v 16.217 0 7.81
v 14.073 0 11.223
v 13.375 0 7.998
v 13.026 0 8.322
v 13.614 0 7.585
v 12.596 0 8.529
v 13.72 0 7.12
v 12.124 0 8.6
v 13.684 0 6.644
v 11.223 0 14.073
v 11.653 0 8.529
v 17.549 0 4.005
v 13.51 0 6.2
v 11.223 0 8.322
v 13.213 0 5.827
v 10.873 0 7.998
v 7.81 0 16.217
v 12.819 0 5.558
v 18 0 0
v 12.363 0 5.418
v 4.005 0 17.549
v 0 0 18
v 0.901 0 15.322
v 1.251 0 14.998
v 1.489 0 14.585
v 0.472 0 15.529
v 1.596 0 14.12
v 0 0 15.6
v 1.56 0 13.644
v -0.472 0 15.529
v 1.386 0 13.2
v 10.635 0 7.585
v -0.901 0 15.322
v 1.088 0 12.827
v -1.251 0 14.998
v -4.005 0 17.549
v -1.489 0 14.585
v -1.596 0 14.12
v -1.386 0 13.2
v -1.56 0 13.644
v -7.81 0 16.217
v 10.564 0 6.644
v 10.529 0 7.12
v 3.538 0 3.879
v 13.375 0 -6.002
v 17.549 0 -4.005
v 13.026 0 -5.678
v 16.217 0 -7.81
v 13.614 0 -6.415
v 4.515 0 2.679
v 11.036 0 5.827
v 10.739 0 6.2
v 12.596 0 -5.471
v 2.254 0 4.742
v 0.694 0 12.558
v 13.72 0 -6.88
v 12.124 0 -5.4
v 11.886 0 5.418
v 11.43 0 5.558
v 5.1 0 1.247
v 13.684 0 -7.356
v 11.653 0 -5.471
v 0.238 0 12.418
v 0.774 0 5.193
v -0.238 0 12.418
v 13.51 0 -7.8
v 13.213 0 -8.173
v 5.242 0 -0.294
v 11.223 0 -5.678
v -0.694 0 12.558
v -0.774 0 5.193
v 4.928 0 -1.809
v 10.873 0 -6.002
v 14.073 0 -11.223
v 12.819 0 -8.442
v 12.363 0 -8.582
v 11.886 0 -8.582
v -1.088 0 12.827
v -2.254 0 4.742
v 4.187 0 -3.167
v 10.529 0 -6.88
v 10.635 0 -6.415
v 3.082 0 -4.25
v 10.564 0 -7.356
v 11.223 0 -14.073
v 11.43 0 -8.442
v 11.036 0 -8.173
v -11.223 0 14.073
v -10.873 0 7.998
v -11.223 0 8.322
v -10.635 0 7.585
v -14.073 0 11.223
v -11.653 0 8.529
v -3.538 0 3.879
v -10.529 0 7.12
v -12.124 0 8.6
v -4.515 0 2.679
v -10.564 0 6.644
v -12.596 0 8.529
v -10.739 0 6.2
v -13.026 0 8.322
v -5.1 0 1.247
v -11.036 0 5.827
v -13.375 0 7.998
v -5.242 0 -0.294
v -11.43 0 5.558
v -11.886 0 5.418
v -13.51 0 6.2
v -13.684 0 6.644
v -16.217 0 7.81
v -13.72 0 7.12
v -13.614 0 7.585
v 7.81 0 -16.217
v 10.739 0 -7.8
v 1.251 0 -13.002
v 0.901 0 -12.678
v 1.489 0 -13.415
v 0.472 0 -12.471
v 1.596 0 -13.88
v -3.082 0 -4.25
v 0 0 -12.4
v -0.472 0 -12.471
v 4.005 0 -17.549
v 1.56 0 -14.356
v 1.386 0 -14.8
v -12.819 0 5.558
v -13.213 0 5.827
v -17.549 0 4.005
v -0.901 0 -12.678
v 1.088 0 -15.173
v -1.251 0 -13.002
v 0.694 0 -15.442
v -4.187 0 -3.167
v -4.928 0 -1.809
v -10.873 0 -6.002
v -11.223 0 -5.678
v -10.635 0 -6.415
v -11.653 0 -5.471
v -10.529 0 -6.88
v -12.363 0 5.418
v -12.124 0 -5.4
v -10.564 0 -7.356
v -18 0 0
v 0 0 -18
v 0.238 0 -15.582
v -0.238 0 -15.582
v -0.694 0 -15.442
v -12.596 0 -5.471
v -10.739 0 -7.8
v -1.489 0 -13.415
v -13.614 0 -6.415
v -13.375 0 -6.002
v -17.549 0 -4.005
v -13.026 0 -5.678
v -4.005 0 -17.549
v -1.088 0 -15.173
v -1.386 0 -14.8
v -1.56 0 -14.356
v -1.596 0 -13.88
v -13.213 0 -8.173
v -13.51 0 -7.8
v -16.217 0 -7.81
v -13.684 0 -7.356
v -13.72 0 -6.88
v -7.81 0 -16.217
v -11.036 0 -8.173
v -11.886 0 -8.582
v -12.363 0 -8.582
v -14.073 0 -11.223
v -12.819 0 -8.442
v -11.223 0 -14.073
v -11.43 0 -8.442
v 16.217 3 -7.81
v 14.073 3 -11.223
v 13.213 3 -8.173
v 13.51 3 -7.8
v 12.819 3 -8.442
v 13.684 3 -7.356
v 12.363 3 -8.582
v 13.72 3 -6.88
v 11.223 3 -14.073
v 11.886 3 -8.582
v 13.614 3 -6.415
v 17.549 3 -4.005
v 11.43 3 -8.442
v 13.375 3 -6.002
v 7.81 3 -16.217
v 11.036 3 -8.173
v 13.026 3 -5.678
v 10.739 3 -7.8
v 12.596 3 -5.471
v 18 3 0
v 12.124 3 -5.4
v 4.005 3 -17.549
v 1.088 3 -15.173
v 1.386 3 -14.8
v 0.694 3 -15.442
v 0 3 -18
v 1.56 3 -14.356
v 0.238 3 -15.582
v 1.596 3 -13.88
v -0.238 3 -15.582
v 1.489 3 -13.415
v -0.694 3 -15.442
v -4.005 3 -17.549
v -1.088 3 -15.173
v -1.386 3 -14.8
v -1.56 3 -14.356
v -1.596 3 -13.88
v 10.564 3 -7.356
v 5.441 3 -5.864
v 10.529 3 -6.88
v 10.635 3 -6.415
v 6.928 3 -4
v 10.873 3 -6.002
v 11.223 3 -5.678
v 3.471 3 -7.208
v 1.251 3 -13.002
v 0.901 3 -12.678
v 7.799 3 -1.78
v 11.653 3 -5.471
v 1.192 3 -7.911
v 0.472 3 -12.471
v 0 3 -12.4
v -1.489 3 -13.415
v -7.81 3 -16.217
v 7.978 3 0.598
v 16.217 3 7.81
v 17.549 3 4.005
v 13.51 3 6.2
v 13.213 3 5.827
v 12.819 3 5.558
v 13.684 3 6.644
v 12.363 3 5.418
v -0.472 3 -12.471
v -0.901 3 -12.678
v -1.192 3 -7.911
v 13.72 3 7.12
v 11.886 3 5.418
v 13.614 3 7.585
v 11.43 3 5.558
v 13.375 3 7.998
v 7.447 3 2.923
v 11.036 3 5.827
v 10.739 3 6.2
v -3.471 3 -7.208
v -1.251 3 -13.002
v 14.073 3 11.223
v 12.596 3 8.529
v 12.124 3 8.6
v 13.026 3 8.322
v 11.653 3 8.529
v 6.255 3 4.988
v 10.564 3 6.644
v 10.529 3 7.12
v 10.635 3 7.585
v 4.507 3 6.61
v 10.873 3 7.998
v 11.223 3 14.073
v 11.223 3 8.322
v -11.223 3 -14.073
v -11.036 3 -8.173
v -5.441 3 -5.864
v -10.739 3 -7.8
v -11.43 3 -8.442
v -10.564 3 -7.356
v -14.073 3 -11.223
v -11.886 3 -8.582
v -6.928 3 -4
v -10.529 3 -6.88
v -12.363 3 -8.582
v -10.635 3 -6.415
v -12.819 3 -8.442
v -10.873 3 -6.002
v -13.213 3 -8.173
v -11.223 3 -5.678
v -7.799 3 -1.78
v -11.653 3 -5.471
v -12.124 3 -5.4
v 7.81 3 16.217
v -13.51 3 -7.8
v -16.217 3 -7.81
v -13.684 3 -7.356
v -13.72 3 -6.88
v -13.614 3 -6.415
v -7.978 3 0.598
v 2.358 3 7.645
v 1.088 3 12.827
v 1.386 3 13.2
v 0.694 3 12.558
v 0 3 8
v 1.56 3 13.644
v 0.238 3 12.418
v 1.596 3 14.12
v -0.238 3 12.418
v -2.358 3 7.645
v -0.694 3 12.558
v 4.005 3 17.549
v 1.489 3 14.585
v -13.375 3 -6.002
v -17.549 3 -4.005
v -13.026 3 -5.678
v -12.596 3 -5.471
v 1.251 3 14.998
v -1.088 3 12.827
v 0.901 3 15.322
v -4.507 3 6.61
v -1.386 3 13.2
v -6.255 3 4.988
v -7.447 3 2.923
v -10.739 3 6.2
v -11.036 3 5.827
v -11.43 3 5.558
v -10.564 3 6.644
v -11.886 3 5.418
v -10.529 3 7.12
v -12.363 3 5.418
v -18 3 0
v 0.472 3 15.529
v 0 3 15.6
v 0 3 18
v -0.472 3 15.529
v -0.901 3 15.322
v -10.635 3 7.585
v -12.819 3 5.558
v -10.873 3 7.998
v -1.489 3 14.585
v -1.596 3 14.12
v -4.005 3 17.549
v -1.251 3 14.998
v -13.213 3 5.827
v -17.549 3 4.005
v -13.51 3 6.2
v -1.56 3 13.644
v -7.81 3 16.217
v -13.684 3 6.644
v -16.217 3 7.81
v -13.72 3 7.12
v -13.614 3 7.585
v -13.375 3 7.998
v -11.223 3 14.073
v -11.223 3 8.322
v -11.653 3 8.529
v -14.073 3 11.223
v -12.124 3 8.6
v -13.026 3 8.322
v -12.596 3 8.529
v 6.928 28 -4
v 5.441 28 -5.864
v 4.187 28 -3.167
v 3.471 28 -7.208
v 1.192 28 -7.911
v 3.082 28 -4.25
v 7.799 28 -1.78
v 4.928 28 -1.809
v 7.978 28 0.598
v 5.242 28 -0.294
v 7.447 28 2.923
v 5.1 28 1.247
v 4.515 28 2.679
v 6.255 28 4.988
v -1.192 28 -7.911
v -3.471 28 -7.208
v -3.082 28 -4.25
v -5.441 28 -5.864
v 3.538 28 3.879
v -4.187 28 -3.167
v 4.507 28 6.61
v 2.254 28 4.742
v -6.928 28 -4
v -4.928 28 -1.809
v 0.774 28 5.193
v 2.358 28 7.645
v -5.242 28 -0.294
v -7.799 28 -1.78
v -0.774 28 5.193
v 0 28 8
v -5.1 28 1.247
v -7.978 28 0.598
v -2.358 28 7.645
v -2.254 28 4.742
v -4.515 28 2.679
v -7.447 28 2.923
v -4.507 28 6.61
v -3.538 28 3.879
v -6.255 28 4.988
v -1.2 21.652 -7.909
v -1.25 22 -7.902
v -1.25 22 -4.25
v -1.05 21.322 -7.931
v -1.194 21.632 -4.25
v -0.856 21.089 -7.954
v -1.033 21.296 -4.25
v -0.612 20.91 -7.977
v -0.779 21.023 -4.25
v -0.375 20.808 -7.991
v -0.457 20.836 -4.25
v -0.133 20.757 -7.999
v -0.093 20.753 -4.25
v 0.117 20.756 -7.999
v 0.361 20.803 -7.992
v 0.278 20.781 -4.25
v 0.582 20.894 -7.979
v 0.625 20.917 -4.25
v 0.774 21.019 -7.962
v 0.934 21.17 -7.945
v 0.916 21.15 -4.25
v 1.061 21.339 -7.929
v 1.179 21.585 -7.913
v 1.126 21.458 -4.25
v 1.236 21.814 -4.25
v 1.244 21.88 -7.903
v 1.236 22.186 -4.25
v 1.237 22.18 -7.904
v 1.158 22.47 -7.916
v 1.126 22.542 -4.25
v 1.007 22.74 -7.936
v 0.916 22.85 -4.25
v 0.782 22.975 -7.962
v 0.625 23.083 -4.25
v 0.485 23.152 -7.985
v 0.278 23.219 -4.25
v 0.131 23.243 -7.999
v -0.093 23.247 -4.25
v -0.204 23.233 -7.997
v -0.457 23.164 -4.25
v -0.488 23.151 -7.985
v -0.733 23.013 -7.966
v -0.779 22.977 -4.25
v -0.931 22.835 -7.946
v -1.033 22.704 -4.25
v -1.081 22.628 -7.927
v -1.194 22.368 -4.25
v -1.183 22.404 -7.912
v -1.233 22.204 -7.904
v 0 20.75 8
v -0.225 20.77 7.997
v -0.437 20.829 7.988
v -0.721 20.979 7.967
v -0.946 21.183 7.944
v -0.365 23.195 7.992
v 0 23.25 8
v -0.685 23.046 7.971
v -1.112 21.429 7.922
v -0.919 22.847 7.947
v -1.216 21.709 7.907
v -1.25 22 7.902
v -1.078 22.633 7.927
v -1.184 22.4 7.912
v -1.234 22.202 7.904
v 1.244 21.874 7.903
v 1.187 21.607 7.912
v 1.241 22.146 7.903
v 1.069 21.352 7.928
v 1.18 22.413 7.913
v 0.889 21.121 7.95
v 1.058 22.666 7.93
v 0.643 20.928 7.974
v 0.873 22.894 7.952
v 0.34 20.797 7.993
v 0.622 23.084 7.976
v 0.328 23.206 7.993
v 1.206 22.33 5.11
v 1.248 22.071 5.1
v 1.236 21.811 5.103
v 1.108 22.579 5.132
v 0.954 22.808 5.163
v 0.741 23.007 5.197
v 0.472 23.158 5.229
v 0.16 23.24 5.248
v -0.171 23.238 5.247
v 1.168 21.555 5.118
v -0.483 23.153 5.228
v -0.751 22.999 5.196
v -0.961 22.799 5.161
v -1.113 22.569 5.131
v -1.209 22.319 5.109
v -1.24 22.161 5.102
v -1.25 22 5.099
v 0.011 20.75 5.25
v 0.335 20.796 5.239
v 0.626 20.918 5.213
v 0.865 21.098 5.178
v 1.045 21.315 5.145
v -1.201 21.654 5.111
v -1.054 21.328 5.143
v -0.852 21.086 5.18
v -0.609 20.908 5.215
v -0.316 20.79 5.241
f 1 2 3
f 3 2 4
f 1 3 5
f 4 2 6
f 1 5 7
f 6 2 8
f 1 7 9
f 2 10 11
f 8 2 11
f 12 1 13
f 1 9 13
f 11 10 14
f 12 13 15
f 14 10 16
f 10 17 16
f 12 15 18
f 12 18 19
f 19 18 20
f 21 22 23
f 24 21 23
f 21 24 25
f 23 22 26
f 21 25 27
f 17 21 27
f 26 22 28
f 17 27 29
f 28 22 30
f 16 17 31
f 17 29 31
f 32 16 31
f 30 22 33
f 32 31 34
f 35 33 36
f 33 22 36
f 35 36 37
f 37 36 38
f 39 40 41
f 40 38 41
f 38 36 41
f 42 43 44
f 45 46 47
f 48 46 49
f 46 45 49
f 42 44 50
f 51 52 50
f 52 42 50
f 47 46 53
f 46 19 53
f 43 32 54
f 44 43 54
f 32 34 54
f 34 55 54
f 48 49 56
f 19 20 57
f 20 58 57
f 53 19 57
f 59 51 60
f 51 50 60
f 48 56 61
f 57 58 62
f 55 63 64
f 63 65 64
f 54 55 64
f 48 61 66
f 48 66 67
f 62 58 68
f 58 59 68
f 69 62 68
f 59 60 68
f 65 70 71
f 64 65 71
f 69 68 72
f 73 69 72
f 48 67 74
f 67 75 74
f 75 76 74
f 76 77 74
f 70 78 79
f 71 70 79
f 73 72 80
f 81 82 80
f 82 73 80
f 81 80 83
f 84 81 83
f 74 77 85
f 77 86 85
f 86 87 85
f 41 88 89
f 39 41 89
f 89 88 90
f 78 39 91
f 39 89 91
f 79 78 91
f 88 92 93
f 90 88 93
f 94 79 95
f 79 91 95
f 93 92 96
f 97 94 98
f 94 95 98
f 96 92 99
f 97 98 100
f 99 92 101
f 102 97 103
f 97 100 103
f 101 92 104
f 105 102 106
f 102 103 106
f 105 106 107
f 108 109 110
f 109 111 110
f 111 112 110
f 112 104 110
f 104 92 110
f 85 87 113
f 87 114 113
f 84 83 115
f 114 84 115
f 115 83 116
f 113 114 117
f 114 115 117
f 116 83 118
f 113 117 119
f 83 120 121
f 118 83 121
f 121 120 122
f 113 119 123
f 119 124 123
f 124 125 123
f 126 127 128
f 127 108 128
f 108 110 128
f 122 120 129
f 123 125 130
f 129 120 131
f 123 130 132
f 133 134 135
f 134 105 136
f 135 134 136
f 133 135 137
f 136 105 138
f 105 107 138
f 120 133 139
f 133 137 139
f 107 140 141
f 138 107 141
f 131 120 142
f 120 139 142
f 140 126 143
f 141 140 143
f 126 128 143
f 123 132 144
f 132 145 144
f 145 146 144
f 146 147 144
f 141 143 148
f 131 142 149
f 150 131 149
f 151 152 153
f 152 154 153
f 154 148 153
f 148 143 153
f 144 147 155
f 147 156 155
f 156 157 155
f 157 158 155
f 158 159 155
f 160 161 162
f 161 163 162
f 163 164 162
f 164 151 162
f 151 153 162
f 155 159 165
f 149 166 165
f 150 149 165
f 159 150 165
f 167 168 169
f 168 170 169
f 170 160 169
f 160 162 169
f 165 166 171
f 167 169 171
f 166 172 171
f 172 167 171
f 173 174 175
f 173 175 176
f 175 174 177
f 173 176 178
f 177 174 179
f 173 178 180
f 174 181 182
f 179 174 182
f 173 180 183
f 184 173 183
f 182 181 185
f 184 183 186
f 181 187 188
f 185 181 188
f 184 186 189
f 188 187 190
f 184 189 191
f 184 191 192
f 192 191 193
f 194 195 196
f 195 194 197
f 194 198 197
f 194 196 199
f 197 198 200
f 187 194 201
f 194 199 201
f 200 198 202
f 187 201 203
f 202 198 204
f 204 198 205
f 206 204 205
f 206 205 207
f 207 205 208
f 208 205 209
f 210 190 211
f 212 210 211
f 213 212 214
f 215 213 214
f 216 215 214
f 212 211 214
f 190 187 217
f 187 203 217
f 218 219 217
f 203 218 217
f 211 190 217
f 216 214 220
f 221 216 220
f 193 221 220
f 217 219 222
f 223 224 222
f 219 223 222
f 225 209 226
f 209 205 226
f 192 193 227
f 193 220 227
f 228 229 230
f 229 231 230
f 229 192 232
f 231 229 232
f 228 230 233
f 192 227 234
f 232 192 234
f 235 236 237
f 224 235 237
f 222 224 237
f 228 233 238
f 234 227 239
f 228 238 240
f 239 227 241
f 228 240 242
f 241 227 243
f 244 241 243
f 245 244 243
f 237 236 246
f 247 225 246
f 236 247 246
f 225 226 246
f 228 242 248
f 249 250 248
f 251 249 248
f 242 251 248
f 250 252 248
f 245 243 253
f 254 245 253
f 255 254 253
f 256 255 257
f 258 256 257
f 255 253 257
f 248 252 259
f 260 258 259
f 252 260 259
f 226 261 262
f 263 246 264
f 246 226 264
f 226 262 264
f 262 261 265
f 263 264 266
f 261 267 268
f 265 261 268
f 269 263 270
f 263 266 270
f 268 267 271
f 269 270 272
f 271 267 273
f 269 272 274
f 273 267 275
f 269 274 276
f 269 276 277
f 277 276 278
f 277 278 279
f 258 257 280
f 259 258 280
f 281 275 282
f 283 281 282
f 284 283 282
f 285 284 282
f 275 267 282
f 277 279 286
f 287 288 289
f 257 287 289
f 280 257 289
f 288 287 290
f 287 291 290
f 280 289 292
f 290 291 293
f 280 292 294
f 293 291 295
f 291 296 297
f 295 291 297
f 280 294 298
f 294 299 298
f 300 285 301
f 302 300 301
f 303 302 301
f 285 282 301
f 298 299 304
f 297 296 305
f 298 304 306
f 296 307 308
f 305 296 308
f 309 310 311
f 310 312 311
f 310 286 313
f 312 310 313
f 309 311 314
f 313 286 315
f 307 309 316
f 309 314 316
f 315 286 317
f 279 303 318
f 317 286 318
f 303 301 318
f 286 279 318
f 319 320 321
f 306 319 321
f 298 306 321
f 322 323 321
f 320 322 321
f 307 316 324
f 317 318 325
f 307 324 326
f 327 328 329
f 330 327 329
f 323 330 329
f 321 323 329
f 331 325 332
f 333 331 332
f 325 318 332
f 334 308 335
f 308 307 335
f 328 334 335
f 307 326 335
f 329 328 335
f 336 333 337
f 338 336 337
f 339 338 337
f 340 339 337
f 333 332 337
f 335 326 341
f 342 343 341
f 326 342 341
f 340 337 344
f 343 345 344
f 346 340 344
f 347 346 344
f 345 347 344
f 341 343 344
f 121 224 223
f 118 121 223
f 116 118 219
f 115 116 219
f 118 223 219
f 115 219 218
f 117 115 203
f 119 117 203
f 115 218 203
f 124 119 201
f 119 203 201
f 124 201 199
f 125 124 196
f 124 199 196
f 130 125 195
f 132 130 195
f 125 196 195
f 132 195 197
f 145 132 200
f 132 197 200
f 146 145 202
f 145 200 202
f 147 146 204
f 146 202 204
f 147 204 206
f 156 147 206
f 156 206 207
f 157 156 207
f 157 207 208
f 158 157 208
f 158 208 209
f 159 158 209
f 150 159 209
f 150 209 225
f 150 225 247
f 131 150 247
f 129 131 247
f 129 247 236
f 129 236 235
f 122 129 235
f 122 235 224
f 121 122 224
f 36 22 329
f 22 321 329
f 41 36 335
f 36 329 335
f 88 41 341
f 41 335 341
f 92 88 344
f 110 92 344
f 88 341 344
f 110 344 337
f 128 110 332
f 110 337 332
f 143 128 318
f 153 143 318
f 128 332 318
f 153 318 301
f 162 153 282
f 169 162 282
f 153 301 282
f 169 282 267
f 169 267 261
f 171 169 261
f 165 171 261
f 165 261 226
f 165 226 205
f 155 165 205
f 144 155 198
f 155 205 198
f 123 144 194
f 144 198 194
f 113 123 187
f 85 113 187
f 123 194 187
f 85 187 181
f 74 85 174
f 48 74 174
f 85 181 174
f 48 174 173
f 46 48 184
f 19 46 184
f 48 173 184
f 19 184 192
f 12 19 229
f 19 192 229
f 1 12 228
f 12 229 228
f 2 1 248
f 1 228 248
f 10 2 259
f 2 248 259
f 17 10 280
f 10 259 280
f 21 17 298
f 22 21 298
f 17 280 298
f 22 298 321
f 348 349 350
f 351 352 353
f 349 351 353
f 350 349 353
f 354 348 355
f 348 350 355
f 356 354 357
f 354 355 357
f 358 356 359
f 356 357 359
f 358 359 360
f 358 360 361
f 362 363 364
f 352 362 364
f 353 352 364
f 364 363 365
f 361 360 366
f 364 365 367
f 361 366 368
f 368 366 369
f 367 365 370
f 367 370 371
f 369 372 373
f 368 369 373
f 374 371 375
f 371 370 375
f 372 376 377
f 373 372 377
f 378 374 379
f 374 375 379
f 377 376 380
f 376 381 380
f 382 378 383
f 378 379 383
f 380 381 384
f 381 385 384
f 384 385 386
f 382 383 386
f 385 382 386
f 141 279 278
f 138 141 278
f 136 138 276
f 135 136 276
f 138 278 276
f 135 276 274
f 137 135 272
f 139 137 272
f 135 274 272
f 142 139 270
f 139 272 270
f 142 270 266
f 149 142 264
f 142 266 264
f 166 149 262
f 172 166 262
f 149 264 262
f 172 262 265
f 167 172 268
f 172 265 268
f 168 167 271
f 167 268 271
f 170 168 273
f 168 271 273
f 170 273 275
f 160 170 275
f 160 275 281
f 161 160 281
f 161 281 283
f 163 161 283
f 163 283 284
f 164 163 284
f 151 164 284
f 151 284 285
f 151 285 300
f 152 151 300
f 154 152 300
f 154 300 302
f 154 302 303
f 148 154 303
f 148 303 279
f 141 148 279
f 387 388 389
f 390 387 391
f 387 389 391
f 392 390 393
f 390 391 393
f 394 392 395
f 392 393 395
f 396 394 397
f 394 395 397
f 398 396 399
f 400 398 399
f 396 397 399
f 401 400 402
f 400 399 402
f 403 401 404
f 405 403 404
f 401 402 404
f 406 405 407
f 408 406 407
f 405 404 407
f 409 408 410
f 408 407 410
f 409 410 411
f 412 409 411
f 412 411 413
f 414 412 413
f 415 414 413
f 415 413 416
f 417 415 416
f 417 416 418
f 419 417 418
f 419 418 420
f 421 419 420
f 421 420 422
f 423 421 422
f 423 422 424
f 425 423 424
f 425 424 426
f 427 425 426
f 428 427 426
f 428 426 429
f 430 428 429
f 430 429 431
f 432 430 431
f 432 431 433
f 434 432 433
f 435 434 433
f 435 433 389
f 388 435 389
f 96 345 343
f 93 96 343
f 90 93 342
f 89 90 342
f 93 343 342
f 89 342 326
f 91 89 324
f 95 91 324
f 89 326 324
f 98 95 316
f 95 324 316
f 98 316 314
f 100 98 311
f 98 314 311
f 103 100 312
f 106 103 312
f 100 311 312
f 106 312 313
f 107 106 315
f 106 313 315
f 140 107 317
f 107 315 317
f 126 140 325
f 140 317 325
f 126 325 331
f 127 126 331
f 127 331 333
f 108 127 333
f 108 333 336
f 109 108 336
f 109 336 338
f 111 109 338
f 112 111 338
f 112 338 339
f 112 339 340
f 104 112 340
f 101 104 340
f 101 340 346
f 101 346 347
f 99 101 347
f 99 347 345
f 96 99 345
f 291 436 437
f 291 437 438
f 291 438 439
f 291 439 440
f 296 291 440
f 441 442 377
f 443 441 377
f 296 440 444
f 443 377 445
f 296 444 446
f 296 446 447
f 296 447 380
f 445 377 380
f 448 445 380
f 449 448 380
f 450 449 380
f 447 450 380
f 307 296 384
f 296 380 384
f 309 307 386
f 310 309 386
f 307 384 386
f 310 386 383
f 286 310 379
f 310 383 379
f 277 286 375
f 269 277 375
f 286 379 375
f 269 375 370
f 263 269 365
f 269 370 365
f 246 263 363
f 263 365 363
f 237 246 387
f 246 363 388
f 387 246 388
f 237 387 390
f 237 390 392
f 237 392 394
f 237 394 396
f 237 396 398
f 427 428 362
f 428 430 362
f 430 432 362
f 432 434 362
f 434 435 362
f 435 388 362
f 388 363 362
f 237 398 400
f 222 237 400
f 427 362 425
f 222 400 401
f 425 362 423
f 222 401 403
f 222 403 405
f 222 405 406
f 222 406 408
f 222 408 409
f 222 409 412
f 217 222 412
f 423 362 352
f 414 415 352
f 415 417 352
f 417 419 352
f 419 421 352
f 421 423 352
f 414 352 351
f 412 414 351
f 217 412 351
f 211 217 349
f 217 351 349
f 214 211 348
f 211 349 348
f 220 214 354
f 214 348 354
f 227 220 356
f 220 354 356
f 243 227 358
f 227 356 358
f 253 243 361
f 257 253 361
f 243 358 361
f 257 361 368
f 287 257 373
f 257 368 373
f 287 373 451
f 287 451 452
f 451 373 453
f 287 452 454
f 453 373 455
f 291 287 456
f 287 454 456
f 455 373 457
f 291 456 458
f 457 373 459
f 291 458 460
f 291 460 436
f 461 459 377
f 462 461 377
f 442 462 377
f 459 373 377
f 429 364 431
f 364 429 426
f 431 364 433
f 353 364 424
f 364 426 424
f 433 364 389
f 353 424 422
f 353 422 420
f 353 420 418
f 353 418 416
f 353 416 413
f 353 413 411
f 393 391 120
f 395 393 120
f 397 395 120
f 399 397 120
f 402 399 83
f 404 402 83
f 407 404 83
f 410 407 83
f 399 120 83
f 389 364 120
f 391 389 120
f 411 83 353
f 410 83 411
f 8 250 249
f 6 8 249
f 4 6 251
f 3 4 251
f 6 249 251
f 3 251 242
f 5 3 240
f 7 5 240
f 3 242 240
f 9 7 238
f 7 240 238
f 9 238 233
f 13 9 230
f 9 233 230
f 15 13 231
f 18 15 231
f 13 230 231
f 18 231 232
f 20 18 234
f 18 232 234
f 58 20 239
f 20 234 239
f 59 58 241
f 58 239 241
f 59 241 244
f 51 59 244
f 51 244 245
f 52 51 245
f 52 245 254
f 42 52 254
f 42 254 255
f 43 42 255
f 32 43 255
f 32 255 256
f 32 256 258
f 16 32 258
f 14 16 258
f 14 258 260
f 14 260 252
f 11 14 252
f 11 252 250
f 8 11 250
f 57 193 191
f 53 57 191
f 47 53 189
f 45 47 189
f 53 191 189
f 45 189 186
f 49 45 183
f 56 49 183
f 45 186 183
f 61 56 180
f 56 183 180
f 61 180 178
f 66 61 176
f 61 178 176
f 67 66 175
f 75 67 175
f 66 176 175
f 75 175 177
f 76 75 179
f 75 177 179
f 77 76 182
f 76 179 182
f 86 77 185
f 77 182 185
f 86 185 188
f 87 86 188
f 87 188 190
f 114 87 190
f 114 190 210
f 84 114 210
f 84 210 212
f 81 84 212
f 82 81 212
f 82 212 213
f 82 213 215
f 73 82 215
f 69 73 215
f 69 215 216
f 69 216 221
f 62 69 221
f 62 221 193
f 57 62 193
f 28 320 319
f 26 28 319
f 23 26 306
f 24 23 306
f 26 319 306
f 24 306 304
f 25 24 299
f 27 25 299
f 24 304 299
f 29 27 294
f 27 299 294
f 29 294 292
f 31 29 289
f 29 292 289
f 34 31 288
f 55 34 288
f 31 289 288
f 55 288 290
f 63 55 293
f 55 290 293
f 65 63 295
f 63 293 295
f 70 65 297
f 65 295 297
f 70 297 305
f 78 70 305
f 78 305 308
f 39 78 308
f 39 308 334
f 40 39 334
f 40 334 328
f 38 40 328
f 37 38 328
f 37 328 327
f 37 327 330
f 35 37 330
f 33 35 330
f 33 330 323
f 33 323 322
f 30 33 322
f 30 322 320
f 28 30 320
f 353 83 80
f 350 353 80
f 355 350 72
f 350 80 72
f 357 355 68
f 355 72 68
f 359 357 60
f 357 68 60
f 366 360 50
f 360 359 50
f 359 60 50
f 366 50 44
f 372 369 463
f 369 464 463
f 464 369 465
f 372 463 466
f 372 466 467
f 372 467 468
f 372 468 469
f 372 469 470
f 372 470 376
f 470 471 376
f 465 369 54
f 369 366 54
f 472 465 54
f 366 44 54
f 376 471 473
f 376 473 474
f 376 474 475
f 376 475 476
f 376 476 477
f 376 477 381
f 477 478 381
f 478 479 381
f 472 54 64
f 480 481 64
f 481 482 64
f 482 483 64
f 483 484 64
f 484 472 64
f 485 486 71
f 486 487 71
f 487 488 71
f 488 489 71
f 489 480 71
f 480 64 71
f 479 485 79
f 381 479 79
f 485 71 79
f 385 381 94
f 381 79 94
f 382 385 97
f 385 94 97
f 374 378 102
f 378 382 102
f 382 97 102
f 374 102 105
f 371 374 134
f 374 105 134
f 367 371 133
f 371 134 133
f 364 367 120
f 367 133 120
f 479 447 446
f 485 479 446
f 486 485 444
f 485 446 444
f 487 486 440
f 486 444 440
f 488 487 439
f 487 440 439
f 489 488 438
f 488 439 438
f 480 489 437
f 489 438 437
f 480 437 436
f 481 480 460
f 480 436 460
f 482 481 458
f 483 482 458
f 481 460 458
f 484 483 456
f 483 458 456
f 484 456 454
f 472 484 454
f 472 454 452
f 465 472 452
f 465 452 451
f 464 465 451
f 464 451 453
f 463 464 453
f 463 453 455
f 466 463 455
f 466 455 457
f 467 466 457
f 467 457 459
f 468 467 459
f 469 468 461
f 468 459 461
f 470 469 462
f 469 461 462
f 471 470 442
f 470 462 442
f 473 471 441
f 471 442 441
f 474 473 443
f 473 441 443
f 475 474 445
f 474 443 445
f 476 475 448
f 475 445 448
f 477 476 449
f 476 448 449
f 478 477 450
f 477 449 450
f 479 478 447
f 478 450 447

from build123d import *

# Parameters (mm, degrees)
SKETCH_2_R          = 1.6
CUT_EXTRUDE_1_DEPTH = 10
EXTRUDE_START       = -28
EXTRUDE_1_DEPTH     = 28
HOLE_WIZARD_M3_2_D  = 2.5


with BuildPart() as part:
    # 草图1 → 旋转1 (revolve)
    with BuildSketch(Plane.XY, mode=Mode.PRIVATE) as revolve_1_sk:
        Polygon((-5.25, 0), (-18, 0), (-18, 3), (-8, 3), (-8, 28), (-5.25, 28), align=None)
    revolve(revolve_1_sk.sketch.rotate(Axis((0, 12.843932511, 0), (0, -1, 0)), 270), axis=Axis((0, 12.843932511, 0), (0, -1, 0)))

    # 草图2 → 切除-拉伸1 (cut)
    with BuildSketch(Plane(origin=(0, 3, 0), x_dir=(1, 0, 0), z_dir=(0, 1, 0))):
        with Locations(Location((0, 14, 0), (0, 0, 270))):
            Circle(SKETCH_2_R)
        with Locations(Location((12.124355653, 7, 0), (0, 0, 270))):
            Circle(SKETCH_2_R)
        with Locations(Location((12.124355653, -7, 0), (0, 0, 270))):
            Circle(SKETCH_2_R)
        with Locations(Location((0, -14, 0), (0, 0, 270))):
            Circle(SKETCH_2_R)
        with Locations(Location((-12.124355653, -7, 0), (0, 0, 270))):
            Circle(SKETCH_2_R)
        with Locations(Location((-12.124355653, 7, 0), (0, 0, 270))):
            Circle(SKETCH_2_R)
    extrude(amount=-CUT_EXTRUDE_1_DEPTH, mode=Mode.SUBTRACT)

    # 草图3 → 凸台-拉伸1 (add)
    with BuildSketch(Plane(origin=(0, 28, 0), x_dir=(1, 0, 0), z_dir=(0, 1, 0)).offset(EXTRUDE_START)):
        with BuildLine():
            Line((-3.082207001, 4.25), (3.082207001, 4.25))
            ThreePointArc((3.082207001, 4.25), (0, 5.25), (-3.082207001, 4.25))
        make_face()
    extrude(amount=EXTRUDE_1_DEPTH)

    # M3 螺纹孔2 (through all)
    with Locations(Plane(origin=(0, 0, -10), x_dir=(1, 0, 0), z_dir=(0, 0, -1))):
        with Locations((0, -22)):
            Hole(HOLE_WIZARD_M3_2_D / 2)


solid = part.part
